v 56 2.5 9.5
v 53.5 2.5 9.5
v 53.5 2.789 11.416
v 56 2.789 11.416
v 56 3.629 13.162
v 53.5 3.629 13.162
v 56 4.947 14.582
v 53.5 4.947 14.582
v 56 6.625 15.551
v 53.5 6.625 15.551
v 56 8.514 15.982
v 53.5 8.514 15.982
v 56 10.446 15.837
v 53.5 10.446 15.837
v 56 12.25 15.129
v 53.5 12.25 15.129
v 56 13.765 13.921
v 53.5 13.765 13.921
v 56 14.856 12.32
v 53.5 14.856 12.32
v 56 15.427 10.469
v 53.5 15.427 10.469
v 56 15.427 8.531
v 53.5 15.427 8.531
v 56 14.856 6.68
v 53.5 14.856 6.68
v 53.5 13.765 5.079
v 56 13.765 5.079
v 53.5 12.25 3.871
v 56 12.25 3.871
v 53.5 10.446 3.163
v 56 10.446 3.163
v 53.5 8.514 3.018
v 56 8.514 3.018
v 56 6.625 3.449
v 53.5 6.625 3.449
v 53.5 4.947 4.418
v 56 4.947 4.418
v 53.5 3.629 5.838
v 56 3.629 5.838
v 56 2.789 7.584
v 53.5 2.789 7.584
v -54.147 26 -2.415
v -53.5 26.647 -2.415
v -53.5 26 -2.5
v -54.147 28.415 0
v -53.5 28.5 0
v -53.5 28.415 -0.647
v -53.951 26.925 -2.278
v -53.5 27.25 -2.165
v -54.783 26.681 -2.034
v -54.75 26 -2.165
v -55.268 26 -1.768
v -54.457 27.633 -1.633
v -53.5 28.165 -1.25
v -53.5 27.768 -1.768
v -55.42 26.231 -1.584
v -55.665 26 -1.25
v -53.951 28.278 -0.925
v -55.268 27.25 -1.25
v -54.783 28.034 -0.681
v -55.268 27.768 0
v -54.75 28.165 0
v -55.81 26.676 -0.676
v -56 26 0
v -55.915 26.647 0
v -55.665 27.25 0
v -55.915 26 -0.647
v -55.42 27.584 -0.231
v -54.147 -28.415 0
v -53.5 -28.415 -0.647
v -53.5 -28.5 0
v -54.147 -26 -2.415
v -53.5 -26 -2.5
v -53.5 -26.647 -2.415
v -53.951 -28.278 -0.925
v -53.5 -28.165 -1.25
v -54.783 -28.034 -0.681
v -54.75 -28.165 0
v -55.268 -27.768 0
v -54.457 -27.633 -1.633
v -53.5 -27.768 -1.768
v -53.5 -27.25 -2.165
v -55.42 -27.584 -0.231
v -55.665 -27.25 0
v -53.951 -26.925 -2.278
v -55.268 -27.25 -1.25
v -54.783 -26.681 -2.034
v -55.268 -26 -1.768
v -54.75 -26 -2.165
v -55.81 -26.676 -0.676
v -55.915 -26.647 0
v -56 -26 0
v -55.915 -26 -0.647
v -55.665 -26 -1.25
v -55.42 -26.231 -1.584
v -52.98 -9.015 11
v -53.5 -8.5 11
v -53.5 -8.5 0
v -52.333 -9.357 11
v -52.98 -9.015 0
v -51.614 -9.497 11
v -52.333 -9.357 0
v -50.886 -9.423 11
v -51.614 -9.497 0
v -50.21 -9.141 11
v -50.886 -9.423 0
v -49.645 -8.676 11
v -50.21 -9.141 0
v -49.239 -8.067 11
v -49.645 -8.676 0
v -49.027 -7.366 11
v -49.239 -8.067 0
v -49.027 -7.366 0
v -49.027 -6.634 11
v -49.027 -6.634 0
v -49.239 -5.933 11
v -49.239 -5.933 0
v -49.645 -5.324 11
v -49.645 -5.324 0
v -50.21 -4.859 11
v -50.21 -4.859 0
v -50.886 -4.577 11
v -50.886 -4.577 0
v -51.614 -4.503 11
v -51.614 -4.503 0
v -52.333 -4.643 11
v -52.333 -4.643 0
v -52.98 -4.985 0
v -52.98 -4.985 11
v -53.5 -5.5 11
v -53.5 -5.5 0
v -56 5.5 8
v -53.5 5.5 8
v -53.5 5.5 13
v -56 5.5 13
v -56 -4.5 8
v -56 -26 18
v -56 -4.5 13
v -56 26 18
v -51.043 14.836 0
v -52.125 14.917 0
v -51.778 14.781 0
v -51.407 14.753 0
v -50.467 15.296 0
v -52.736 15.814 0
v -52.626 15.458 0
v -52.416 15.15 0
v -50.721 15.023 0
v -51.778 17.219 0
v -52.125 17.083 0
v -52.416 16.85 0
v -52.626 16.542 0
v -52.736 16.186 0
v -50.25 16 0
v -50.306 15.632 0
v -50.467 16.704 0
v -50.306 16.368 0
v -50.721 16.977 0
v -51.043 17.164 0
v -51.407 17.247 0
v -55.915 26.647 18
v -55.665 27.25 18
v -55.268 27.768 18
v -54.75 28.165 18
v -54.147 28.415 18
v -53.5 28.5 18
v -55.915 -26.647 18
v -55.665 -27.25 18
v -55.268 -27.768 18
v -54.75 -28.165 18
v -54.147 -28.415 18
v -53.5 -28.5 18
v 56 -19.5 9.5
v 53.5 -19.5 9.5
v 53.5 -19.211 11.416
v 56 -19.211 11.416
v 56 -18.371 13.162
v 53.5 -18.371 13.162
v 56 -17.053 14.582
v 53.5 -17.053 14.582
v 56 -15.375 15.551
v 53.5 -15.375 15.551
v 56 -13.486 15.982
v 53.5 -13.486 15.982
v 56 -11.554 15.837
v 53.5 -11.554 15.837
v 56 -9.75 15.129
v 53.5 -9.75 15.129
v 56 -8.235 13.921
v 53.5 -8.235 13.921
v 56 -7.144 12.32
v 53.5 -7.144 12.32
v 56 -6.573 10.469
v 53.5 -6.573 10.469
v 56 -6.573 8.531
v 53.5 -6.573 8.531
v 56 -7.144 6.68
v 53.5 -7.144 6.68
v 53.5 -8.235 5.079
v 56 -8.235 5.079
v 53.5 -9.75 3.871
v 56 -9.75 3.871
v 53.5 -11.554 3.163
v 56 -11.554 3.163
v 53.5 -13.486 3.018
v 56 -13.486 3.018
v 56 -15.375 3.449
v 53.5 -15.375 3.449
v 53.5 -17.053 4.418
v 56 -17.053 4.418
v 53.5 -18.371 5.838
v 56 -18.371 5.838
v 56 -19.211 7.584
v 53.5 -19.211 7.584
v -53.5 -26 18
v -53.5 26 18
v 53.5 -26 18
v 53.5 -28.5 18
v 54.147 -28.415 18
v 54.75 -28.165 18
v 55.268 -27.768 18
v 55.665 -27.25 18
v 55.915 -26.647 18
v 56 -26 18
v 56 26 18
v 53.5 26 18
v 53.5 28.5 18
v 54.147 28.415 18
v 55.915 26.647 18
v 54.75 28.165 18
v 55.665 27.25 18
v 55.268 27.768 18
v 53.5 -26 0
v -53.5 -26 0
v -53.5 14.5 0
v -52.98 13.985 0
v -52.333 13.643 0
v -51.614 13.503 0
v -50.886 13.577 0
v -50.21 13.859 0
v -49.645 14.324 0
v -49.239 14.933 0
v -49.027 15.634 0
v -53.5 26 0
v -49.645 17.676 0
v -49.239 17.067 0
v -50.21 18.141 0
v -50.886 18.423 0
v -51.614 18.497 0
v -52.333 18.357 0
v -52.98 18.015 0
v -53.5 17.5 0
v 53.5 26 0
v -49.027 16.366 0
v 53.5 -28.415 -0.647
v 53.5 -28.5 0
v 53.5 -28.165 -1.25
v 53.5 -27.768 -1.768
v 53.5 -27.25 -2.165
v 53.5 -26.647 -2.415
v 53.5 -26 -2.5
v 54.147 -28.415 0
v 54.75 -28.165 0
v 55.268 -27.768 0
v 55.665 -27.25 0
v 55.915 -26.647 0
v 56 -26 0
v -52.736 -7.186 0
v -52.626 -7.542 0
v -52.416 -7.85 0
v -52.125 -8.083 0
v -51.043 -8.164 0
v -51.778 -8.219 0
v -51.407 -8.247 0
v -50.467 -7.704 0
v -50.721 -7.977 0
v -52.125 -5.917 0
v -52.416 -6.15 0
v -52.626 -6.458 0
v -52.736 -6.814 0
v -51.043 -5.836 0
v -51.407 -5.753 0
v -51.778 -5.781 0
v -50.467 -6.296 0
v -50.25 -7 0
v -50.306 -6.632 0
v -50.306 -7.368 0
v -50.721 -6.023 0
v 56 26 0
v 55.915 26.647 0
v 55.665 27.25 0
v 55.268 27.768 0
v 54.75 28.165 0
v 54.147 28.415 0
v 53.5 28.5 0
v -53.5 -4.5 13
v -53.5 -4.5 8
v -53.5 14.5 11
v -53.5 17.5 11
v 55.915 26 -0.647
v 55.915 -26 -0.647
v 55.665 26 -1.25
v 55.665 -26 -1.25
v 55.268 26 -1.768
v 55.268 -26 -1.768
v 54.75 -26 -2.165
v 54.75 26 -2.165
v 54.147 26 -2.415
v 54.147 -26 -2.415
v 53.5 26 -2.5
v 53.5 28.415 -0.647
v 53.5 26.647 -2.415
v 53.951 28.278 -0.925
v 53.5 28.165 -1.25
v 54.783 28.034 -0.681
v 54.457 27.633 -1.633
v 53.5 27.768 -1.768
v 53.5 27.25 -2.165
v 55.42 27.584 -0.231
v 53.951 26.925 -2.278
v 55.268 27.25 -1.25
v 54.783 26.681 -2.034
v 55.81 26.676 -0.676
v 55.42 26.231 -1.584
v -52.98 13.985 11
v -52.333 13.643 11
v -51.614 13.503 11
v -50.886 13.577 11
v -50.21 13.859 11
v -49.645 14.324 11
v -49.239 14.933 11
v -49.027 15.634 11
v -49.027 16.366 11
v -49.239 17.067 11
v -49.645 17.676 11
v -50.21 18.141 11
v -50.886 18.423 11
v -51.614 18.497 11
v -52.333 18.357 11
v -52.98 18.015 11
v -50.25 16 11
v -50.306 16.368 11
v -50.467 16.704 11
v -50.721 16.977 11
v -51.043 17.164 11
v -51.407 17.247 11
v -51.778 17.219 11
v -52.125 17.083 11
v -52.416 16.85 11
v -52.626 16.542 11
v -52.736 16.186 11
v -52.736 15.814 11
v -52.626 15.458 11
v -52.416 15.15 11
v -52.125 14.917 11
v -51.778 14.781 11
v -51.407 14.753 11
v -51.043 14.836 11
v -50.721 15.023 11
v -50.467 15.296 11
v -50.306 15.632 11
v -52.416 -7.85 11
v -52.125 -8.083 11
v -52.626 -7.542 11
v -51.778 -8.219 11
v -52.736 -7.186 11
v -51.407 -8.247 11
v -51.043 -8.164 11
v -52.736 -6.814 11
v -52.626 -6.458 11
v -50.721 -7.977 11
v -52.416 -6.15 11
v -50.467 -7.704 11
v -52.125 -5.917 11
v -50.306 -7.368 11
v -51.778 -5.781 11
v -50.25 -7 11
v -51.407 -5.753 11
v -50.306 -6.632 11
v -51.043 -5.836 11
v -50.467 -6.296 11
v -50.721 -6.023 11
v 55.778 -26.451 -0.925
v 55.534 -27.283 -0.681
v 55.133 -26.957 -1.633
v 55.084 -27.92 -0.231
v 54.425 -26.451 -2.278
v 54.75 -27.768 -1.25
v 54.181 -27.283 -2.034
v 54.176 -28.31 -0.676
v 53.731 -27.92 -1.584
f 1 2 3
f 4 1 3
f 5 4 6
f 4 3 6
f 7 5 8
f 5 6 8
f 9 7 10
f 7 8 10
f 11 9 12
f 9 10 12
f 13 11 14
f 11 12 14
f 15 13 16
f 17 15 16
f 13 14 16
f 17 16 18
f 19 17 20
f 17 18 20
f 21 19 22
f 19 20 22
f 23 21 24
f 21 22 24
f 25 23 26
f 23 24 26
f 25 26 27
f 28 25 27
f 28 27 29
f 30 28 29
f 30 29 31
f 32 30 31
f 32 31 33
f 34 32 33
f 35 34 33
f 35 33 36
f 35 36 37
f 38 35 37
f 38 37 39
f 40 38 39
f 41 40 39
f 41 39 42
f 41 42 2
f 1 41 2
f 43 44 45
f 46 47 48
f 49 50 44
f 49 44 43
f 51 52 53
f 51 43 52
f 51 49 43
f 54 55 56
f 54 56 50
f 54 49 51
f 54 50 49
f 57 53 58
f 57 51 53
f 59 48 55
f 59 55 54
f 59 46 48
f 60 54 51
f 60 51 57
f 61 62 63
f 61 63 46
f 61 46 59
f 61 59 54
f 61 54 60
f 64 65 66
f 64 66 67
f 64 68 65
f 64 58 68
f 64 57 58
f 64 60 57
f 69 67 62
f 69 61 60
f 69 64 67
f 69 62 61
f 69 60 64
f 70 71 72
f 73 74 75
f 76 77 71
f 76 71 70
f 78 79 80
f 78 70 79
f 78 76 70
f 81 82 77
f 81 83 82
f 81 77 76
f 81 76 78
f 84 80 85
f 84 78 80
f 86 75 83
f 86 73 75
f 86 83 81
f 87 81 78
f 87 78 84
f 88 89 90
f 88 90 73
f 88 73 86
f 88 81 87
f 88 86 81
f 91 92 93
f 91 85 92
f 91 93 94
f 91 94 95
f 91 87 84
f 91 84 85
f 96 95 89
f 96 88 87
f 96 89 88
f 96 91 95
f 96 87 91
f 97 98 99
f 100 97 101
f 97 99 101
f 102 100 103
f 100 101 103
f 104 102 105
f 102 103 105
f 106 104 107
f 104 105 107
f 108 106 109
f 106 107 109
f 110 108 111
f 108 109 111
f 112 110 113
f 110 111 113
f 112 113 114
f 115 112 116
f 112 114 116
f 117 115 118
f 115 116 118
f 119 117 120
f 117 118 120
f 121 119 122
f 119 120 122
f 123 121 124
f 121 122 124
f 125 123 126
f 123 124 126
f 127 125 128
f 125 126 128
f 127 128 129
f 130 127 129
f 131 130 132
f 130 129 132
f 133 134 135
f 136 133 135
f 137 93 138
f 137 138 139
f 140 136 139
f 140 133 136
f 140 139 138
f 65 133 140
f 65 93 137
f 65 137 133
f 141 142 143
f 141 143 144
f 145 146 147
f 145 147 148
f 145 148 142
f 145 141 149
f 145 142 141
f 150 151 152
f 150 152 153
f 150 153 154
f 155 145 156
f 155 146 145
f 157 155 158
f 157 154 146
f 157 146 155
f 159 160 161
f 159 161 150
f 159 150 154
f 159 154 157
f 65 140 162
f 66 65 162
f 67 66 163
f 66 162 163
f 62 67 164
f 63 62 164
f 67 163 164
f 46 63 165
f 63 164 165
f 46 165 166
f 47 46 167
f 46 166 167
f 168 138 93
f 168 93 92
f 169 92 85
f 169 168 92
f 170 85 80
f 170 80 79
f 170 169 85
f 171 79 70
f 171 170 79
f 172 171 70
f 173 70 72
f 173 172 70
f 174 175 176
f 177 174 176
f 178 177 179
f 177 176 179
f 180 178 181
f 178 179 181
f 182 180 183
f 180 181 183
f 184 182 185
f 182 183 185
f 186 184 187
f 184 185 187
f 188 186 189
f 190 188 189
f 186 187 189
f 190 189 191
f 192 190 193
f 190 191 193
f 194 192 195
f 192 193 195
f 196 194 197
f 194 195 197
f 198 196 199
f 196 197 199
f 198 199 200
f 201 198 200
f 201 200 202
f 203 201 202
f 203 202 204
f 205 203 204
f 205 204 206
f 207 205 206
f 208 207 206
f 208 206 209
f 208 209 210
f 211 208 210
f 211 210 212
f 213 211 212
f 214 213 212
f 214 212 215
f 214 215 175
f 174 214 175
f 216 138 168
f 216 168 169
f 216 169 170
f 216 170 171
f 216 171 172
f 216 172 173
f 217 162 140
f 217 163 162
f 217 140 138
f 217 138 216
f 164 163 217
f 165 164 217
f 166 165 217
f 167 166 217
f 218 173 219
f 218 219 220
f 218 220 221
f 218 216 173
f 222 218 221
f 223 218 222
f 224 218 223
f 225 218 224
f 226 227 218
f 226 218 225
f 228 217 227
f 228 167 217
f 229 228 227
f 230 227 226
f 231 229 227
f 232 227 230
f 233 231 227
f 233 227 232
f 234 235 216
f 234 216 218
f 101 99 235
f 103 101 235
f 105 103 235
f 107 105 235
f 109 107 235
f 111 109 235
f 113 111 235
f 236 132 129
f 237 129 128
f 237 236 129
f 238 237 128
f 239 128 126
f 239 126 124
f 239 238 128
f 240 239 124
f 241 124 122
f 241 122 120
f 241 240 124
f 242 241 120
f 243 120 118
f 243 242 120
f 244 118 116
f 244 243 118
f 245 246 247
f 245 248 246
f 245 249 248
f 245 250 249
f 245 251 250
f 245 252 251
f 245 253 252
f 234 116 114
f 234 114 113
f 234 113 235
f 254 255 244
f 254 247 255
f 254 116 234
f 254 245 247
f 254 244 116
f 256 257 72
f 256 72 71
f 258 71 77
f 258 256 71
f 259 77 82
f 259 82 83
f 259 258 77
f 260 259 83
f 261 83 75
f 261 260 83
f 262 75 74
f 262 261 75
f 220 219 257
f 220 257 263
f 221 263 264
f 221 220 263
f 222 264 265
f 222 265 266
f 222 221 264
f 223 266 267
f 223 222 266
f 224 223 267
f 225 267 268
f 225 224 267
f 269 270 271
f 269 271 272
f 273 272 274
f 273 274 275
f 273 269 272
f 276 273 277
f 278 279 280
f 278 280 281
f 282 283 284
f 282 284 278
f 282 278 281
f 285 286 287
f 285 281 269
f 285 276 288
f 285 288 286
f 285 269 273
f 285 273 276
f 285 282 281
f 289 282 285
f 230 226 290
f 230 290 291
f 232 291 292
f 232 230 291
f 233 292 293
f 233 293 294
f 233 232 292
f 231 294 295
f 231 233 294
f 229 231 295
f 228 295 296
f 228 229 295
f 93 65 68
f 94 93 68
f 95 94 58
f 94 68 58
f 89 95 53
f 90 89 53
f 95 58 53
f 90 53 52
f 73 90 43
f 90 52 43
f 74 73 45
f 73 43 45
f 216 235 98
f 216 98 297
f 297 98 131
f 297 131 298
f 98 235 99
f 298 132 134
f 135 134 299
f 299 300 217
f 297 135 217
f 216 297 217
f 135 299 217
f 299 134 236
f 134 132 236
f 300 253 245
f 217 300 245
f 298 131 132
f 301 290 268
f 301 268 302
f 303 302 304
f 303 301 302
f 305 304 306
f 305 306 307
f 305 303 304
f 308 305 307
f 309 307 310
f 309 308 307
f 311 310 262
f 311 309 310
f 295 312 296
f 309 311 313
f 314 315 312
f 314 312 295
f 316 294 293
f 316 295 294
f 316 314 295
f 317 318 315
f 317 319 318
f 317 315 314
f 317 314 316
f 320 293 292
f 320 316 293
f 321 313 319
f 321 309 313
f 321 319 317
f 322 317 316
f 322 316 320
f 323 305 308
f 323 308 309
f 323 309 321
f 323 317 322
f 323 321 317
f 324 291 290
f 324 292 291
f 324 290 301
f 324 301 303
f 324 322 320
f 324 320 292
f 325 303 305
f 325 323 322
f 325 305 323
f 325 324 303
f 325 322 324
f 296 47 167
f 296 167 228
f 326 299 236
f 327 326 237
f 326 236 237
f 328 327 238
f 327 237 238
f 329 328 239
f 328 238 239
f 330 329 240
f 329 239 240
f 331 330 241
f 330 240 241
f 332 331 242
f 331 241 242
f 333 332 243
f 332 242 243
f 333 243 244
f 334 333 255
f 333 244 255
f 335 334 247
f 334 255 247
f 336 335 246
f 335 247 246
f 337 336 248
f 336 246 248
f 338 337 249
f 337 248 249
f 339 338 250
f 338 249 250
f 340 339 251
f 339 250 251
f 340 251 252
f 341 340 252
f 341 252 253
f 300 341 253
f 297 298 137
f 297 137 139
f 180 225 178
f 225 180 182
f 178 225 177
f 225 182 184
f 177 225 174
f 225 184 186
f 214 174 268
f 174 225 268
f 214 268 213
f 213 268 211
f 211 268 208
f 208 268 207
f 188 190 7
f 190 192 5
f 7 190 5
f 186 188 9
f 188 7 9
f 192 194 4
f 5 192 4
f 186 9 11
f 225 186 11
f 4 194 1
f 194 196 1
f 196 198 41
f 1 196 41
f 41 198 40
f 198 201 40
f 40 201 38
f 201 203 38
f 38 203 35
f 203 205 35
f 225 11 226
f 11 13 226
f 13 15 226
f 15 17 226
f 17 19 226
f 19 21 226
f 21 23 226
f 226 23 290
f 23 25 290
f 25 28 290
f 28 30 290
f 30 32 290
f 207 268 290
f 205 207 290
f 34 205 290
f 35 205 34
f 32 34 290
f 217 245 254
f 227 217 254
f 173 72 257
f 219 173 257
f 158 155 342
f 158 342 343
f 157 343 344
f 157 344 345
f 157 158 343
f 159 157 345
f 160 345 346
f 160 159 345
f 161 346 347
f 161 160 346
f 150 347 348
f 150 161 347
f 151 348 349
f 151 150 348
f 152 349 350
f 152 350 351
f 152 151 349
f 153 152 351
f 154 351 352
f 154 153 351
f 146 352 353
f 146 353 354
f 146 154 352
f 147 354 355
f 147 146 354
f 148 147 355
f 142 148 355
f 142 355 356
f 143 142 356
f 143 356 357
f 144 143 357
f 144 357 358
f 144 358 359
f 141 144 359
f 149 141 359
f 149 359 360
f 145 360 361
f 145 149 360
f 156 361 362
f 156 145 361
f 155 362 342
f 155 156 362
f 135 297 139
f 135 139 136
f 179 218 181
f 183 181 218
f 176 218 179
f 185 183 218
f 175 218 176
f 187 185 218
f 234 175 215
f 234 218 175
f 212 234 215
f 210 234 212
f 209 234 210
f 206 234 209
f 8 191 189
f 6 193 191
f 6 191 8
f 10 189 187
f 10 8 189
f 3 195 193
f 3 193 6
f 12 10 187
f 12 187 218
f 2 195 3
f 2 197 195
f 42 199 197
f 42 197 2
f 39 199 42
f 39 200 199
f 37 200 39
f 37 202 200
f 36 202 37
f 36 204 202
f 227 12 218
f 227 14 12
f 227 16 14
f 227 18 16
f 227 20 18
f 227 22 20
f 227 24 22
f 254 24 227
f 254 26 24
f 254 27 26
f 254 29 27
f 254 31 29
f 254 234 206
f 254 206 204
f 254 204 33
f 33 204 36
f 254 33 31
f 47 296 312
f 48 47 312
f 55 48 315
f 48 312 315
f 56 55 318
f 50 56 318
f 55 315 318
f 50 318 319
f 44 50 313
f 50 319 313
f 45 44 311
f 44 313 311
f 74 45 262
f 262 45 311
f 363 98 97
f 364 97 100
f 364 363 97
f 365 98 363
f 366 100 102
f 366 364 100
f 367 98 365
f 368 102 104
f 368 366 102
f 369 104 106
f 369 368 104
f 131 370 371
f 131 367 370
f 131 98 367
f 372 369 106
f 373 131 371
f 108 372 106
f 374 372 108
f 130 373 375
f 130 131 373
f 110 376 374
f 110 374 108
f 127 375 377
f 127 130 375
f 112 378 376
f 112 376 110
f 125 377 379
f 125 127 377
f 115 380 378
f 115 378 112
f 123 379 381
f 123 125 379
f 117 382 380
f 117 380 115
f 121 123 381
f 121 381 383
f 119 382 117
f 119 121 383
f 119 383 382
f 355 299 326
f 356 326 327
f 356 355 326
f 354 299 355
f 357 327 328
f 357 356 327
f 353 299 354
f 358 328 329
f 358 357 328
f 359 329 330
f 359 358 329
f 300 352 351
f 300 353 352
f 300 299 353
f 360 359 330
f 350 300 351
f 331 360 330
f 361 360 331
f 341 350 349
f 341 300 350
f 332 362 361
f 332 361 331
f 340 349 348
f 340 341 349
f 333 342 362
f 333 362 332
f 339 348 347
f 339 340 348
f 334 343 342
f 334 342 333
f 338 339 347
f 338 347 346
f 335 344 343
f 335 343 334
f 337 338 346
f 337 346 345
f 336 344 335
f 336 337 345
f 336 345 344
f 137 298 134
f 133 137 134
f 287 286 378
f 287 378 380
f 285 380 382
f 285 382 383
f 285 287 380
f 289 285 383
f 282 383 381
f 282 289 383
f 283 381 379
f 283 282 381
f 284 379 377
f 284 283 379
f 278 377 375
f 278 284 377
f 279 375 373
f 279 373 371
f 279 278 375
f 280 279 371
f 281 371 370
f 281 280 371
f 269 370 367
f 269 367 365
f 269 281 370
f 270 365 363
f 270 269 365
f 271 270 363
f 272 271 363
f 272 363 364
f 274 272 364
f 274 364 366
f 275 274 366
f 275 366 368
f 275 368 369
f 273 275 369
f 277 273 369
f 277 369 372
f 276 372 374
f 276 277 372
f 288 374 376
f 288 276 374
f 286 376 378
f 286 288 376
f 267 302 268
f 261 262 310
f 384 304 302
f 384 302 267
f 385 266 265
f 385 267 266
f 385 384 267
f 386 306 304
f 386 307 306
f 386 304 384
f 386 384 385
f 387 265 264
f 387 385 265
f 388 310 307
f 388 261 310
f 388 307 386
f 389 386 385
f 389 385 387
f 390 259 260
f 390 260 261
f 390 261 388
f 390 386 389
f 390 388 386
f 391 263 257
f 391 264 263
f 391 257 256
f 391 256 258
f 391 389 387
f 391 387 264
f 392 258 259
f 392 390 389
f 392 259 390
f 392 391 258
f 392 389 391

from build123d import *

# Parameters (mm, degrees)
SKETCH_W        = 107
SKETCH_H        = 52
PAD_DEPTH       = 18
THICKNESS_T     = 2.5
SKETCH001_R     = 6.5
POCKET_DEPTH    = 5
SKETCH002_W     = 10
SKETCH002_H     = 5
POCKET001_DEPTH = 5
SKETCH003_R     = 2.5
SKETCH003_R_2   = 1.25
PAD001_DEPTH    = 11


with BuildPart() as part:
    # Sketch → Pad (new body)
    with BuildSketch(Plane.XY):
        Rectangle(SKETCH_W, SKETCH_H)
    extrude(amount=PAD_DEPTH)

    # Thickness
    thickness_openings = [part.faces().sort_by_distance(p)[0] for p in [
        (0, 0, 18),
    ]]
    offset(amount=THICKNESS_T, openings=thickness_openings)

    # Sketch001 (on DatumPlane) → Pocket (cut)
    with BuildSketch(Plane(origin=(53.5, 0, 0), x_dir=(0, -1, 0), z_dir=(-1, 0, 0))):
        with Locations((-9, 9.5)):
            Circle(SKETCH001_R)
        with Locations((13, 9.5)):
            Circle(SKETCH001_R)
    extrude(amount=-POCKET_DEPTH, mode=Mode.SUBTRACT)

    # Sketch002 (on DatumPlane) → Pocket001 (cut)
    with BuildSketch(Plane.YZ.offset(-53.5)):
        with Locations((0.5, 10.5)):
            Rectangle(SKETCH002_W, SKETCH002_H)
    extrude(amount=-POCKET001_DEPTH, mode=Mode.SUBTRACT)

    # Sketch003 (on DatumPlane) → Pad001 (join)
    with BuildSketch(Plane.XY):
        with Locations((-51.5, 16)):
            Circle(SKETCH003_R)
        with Locations((-51.5, 16)):
            Circle(SKETCH003_R_2, mode=Mode.SUBTRACT)
        with Locations((-51.5, -7)):
            Circle(SKETCH003_R)
        with Locations((-51.5, -7)):
            Circle(SKETCH003_R_2, mode=Mode.SUBTRACT)
    extrude(amount=PAD001_DEPTH)


solid = part.part
